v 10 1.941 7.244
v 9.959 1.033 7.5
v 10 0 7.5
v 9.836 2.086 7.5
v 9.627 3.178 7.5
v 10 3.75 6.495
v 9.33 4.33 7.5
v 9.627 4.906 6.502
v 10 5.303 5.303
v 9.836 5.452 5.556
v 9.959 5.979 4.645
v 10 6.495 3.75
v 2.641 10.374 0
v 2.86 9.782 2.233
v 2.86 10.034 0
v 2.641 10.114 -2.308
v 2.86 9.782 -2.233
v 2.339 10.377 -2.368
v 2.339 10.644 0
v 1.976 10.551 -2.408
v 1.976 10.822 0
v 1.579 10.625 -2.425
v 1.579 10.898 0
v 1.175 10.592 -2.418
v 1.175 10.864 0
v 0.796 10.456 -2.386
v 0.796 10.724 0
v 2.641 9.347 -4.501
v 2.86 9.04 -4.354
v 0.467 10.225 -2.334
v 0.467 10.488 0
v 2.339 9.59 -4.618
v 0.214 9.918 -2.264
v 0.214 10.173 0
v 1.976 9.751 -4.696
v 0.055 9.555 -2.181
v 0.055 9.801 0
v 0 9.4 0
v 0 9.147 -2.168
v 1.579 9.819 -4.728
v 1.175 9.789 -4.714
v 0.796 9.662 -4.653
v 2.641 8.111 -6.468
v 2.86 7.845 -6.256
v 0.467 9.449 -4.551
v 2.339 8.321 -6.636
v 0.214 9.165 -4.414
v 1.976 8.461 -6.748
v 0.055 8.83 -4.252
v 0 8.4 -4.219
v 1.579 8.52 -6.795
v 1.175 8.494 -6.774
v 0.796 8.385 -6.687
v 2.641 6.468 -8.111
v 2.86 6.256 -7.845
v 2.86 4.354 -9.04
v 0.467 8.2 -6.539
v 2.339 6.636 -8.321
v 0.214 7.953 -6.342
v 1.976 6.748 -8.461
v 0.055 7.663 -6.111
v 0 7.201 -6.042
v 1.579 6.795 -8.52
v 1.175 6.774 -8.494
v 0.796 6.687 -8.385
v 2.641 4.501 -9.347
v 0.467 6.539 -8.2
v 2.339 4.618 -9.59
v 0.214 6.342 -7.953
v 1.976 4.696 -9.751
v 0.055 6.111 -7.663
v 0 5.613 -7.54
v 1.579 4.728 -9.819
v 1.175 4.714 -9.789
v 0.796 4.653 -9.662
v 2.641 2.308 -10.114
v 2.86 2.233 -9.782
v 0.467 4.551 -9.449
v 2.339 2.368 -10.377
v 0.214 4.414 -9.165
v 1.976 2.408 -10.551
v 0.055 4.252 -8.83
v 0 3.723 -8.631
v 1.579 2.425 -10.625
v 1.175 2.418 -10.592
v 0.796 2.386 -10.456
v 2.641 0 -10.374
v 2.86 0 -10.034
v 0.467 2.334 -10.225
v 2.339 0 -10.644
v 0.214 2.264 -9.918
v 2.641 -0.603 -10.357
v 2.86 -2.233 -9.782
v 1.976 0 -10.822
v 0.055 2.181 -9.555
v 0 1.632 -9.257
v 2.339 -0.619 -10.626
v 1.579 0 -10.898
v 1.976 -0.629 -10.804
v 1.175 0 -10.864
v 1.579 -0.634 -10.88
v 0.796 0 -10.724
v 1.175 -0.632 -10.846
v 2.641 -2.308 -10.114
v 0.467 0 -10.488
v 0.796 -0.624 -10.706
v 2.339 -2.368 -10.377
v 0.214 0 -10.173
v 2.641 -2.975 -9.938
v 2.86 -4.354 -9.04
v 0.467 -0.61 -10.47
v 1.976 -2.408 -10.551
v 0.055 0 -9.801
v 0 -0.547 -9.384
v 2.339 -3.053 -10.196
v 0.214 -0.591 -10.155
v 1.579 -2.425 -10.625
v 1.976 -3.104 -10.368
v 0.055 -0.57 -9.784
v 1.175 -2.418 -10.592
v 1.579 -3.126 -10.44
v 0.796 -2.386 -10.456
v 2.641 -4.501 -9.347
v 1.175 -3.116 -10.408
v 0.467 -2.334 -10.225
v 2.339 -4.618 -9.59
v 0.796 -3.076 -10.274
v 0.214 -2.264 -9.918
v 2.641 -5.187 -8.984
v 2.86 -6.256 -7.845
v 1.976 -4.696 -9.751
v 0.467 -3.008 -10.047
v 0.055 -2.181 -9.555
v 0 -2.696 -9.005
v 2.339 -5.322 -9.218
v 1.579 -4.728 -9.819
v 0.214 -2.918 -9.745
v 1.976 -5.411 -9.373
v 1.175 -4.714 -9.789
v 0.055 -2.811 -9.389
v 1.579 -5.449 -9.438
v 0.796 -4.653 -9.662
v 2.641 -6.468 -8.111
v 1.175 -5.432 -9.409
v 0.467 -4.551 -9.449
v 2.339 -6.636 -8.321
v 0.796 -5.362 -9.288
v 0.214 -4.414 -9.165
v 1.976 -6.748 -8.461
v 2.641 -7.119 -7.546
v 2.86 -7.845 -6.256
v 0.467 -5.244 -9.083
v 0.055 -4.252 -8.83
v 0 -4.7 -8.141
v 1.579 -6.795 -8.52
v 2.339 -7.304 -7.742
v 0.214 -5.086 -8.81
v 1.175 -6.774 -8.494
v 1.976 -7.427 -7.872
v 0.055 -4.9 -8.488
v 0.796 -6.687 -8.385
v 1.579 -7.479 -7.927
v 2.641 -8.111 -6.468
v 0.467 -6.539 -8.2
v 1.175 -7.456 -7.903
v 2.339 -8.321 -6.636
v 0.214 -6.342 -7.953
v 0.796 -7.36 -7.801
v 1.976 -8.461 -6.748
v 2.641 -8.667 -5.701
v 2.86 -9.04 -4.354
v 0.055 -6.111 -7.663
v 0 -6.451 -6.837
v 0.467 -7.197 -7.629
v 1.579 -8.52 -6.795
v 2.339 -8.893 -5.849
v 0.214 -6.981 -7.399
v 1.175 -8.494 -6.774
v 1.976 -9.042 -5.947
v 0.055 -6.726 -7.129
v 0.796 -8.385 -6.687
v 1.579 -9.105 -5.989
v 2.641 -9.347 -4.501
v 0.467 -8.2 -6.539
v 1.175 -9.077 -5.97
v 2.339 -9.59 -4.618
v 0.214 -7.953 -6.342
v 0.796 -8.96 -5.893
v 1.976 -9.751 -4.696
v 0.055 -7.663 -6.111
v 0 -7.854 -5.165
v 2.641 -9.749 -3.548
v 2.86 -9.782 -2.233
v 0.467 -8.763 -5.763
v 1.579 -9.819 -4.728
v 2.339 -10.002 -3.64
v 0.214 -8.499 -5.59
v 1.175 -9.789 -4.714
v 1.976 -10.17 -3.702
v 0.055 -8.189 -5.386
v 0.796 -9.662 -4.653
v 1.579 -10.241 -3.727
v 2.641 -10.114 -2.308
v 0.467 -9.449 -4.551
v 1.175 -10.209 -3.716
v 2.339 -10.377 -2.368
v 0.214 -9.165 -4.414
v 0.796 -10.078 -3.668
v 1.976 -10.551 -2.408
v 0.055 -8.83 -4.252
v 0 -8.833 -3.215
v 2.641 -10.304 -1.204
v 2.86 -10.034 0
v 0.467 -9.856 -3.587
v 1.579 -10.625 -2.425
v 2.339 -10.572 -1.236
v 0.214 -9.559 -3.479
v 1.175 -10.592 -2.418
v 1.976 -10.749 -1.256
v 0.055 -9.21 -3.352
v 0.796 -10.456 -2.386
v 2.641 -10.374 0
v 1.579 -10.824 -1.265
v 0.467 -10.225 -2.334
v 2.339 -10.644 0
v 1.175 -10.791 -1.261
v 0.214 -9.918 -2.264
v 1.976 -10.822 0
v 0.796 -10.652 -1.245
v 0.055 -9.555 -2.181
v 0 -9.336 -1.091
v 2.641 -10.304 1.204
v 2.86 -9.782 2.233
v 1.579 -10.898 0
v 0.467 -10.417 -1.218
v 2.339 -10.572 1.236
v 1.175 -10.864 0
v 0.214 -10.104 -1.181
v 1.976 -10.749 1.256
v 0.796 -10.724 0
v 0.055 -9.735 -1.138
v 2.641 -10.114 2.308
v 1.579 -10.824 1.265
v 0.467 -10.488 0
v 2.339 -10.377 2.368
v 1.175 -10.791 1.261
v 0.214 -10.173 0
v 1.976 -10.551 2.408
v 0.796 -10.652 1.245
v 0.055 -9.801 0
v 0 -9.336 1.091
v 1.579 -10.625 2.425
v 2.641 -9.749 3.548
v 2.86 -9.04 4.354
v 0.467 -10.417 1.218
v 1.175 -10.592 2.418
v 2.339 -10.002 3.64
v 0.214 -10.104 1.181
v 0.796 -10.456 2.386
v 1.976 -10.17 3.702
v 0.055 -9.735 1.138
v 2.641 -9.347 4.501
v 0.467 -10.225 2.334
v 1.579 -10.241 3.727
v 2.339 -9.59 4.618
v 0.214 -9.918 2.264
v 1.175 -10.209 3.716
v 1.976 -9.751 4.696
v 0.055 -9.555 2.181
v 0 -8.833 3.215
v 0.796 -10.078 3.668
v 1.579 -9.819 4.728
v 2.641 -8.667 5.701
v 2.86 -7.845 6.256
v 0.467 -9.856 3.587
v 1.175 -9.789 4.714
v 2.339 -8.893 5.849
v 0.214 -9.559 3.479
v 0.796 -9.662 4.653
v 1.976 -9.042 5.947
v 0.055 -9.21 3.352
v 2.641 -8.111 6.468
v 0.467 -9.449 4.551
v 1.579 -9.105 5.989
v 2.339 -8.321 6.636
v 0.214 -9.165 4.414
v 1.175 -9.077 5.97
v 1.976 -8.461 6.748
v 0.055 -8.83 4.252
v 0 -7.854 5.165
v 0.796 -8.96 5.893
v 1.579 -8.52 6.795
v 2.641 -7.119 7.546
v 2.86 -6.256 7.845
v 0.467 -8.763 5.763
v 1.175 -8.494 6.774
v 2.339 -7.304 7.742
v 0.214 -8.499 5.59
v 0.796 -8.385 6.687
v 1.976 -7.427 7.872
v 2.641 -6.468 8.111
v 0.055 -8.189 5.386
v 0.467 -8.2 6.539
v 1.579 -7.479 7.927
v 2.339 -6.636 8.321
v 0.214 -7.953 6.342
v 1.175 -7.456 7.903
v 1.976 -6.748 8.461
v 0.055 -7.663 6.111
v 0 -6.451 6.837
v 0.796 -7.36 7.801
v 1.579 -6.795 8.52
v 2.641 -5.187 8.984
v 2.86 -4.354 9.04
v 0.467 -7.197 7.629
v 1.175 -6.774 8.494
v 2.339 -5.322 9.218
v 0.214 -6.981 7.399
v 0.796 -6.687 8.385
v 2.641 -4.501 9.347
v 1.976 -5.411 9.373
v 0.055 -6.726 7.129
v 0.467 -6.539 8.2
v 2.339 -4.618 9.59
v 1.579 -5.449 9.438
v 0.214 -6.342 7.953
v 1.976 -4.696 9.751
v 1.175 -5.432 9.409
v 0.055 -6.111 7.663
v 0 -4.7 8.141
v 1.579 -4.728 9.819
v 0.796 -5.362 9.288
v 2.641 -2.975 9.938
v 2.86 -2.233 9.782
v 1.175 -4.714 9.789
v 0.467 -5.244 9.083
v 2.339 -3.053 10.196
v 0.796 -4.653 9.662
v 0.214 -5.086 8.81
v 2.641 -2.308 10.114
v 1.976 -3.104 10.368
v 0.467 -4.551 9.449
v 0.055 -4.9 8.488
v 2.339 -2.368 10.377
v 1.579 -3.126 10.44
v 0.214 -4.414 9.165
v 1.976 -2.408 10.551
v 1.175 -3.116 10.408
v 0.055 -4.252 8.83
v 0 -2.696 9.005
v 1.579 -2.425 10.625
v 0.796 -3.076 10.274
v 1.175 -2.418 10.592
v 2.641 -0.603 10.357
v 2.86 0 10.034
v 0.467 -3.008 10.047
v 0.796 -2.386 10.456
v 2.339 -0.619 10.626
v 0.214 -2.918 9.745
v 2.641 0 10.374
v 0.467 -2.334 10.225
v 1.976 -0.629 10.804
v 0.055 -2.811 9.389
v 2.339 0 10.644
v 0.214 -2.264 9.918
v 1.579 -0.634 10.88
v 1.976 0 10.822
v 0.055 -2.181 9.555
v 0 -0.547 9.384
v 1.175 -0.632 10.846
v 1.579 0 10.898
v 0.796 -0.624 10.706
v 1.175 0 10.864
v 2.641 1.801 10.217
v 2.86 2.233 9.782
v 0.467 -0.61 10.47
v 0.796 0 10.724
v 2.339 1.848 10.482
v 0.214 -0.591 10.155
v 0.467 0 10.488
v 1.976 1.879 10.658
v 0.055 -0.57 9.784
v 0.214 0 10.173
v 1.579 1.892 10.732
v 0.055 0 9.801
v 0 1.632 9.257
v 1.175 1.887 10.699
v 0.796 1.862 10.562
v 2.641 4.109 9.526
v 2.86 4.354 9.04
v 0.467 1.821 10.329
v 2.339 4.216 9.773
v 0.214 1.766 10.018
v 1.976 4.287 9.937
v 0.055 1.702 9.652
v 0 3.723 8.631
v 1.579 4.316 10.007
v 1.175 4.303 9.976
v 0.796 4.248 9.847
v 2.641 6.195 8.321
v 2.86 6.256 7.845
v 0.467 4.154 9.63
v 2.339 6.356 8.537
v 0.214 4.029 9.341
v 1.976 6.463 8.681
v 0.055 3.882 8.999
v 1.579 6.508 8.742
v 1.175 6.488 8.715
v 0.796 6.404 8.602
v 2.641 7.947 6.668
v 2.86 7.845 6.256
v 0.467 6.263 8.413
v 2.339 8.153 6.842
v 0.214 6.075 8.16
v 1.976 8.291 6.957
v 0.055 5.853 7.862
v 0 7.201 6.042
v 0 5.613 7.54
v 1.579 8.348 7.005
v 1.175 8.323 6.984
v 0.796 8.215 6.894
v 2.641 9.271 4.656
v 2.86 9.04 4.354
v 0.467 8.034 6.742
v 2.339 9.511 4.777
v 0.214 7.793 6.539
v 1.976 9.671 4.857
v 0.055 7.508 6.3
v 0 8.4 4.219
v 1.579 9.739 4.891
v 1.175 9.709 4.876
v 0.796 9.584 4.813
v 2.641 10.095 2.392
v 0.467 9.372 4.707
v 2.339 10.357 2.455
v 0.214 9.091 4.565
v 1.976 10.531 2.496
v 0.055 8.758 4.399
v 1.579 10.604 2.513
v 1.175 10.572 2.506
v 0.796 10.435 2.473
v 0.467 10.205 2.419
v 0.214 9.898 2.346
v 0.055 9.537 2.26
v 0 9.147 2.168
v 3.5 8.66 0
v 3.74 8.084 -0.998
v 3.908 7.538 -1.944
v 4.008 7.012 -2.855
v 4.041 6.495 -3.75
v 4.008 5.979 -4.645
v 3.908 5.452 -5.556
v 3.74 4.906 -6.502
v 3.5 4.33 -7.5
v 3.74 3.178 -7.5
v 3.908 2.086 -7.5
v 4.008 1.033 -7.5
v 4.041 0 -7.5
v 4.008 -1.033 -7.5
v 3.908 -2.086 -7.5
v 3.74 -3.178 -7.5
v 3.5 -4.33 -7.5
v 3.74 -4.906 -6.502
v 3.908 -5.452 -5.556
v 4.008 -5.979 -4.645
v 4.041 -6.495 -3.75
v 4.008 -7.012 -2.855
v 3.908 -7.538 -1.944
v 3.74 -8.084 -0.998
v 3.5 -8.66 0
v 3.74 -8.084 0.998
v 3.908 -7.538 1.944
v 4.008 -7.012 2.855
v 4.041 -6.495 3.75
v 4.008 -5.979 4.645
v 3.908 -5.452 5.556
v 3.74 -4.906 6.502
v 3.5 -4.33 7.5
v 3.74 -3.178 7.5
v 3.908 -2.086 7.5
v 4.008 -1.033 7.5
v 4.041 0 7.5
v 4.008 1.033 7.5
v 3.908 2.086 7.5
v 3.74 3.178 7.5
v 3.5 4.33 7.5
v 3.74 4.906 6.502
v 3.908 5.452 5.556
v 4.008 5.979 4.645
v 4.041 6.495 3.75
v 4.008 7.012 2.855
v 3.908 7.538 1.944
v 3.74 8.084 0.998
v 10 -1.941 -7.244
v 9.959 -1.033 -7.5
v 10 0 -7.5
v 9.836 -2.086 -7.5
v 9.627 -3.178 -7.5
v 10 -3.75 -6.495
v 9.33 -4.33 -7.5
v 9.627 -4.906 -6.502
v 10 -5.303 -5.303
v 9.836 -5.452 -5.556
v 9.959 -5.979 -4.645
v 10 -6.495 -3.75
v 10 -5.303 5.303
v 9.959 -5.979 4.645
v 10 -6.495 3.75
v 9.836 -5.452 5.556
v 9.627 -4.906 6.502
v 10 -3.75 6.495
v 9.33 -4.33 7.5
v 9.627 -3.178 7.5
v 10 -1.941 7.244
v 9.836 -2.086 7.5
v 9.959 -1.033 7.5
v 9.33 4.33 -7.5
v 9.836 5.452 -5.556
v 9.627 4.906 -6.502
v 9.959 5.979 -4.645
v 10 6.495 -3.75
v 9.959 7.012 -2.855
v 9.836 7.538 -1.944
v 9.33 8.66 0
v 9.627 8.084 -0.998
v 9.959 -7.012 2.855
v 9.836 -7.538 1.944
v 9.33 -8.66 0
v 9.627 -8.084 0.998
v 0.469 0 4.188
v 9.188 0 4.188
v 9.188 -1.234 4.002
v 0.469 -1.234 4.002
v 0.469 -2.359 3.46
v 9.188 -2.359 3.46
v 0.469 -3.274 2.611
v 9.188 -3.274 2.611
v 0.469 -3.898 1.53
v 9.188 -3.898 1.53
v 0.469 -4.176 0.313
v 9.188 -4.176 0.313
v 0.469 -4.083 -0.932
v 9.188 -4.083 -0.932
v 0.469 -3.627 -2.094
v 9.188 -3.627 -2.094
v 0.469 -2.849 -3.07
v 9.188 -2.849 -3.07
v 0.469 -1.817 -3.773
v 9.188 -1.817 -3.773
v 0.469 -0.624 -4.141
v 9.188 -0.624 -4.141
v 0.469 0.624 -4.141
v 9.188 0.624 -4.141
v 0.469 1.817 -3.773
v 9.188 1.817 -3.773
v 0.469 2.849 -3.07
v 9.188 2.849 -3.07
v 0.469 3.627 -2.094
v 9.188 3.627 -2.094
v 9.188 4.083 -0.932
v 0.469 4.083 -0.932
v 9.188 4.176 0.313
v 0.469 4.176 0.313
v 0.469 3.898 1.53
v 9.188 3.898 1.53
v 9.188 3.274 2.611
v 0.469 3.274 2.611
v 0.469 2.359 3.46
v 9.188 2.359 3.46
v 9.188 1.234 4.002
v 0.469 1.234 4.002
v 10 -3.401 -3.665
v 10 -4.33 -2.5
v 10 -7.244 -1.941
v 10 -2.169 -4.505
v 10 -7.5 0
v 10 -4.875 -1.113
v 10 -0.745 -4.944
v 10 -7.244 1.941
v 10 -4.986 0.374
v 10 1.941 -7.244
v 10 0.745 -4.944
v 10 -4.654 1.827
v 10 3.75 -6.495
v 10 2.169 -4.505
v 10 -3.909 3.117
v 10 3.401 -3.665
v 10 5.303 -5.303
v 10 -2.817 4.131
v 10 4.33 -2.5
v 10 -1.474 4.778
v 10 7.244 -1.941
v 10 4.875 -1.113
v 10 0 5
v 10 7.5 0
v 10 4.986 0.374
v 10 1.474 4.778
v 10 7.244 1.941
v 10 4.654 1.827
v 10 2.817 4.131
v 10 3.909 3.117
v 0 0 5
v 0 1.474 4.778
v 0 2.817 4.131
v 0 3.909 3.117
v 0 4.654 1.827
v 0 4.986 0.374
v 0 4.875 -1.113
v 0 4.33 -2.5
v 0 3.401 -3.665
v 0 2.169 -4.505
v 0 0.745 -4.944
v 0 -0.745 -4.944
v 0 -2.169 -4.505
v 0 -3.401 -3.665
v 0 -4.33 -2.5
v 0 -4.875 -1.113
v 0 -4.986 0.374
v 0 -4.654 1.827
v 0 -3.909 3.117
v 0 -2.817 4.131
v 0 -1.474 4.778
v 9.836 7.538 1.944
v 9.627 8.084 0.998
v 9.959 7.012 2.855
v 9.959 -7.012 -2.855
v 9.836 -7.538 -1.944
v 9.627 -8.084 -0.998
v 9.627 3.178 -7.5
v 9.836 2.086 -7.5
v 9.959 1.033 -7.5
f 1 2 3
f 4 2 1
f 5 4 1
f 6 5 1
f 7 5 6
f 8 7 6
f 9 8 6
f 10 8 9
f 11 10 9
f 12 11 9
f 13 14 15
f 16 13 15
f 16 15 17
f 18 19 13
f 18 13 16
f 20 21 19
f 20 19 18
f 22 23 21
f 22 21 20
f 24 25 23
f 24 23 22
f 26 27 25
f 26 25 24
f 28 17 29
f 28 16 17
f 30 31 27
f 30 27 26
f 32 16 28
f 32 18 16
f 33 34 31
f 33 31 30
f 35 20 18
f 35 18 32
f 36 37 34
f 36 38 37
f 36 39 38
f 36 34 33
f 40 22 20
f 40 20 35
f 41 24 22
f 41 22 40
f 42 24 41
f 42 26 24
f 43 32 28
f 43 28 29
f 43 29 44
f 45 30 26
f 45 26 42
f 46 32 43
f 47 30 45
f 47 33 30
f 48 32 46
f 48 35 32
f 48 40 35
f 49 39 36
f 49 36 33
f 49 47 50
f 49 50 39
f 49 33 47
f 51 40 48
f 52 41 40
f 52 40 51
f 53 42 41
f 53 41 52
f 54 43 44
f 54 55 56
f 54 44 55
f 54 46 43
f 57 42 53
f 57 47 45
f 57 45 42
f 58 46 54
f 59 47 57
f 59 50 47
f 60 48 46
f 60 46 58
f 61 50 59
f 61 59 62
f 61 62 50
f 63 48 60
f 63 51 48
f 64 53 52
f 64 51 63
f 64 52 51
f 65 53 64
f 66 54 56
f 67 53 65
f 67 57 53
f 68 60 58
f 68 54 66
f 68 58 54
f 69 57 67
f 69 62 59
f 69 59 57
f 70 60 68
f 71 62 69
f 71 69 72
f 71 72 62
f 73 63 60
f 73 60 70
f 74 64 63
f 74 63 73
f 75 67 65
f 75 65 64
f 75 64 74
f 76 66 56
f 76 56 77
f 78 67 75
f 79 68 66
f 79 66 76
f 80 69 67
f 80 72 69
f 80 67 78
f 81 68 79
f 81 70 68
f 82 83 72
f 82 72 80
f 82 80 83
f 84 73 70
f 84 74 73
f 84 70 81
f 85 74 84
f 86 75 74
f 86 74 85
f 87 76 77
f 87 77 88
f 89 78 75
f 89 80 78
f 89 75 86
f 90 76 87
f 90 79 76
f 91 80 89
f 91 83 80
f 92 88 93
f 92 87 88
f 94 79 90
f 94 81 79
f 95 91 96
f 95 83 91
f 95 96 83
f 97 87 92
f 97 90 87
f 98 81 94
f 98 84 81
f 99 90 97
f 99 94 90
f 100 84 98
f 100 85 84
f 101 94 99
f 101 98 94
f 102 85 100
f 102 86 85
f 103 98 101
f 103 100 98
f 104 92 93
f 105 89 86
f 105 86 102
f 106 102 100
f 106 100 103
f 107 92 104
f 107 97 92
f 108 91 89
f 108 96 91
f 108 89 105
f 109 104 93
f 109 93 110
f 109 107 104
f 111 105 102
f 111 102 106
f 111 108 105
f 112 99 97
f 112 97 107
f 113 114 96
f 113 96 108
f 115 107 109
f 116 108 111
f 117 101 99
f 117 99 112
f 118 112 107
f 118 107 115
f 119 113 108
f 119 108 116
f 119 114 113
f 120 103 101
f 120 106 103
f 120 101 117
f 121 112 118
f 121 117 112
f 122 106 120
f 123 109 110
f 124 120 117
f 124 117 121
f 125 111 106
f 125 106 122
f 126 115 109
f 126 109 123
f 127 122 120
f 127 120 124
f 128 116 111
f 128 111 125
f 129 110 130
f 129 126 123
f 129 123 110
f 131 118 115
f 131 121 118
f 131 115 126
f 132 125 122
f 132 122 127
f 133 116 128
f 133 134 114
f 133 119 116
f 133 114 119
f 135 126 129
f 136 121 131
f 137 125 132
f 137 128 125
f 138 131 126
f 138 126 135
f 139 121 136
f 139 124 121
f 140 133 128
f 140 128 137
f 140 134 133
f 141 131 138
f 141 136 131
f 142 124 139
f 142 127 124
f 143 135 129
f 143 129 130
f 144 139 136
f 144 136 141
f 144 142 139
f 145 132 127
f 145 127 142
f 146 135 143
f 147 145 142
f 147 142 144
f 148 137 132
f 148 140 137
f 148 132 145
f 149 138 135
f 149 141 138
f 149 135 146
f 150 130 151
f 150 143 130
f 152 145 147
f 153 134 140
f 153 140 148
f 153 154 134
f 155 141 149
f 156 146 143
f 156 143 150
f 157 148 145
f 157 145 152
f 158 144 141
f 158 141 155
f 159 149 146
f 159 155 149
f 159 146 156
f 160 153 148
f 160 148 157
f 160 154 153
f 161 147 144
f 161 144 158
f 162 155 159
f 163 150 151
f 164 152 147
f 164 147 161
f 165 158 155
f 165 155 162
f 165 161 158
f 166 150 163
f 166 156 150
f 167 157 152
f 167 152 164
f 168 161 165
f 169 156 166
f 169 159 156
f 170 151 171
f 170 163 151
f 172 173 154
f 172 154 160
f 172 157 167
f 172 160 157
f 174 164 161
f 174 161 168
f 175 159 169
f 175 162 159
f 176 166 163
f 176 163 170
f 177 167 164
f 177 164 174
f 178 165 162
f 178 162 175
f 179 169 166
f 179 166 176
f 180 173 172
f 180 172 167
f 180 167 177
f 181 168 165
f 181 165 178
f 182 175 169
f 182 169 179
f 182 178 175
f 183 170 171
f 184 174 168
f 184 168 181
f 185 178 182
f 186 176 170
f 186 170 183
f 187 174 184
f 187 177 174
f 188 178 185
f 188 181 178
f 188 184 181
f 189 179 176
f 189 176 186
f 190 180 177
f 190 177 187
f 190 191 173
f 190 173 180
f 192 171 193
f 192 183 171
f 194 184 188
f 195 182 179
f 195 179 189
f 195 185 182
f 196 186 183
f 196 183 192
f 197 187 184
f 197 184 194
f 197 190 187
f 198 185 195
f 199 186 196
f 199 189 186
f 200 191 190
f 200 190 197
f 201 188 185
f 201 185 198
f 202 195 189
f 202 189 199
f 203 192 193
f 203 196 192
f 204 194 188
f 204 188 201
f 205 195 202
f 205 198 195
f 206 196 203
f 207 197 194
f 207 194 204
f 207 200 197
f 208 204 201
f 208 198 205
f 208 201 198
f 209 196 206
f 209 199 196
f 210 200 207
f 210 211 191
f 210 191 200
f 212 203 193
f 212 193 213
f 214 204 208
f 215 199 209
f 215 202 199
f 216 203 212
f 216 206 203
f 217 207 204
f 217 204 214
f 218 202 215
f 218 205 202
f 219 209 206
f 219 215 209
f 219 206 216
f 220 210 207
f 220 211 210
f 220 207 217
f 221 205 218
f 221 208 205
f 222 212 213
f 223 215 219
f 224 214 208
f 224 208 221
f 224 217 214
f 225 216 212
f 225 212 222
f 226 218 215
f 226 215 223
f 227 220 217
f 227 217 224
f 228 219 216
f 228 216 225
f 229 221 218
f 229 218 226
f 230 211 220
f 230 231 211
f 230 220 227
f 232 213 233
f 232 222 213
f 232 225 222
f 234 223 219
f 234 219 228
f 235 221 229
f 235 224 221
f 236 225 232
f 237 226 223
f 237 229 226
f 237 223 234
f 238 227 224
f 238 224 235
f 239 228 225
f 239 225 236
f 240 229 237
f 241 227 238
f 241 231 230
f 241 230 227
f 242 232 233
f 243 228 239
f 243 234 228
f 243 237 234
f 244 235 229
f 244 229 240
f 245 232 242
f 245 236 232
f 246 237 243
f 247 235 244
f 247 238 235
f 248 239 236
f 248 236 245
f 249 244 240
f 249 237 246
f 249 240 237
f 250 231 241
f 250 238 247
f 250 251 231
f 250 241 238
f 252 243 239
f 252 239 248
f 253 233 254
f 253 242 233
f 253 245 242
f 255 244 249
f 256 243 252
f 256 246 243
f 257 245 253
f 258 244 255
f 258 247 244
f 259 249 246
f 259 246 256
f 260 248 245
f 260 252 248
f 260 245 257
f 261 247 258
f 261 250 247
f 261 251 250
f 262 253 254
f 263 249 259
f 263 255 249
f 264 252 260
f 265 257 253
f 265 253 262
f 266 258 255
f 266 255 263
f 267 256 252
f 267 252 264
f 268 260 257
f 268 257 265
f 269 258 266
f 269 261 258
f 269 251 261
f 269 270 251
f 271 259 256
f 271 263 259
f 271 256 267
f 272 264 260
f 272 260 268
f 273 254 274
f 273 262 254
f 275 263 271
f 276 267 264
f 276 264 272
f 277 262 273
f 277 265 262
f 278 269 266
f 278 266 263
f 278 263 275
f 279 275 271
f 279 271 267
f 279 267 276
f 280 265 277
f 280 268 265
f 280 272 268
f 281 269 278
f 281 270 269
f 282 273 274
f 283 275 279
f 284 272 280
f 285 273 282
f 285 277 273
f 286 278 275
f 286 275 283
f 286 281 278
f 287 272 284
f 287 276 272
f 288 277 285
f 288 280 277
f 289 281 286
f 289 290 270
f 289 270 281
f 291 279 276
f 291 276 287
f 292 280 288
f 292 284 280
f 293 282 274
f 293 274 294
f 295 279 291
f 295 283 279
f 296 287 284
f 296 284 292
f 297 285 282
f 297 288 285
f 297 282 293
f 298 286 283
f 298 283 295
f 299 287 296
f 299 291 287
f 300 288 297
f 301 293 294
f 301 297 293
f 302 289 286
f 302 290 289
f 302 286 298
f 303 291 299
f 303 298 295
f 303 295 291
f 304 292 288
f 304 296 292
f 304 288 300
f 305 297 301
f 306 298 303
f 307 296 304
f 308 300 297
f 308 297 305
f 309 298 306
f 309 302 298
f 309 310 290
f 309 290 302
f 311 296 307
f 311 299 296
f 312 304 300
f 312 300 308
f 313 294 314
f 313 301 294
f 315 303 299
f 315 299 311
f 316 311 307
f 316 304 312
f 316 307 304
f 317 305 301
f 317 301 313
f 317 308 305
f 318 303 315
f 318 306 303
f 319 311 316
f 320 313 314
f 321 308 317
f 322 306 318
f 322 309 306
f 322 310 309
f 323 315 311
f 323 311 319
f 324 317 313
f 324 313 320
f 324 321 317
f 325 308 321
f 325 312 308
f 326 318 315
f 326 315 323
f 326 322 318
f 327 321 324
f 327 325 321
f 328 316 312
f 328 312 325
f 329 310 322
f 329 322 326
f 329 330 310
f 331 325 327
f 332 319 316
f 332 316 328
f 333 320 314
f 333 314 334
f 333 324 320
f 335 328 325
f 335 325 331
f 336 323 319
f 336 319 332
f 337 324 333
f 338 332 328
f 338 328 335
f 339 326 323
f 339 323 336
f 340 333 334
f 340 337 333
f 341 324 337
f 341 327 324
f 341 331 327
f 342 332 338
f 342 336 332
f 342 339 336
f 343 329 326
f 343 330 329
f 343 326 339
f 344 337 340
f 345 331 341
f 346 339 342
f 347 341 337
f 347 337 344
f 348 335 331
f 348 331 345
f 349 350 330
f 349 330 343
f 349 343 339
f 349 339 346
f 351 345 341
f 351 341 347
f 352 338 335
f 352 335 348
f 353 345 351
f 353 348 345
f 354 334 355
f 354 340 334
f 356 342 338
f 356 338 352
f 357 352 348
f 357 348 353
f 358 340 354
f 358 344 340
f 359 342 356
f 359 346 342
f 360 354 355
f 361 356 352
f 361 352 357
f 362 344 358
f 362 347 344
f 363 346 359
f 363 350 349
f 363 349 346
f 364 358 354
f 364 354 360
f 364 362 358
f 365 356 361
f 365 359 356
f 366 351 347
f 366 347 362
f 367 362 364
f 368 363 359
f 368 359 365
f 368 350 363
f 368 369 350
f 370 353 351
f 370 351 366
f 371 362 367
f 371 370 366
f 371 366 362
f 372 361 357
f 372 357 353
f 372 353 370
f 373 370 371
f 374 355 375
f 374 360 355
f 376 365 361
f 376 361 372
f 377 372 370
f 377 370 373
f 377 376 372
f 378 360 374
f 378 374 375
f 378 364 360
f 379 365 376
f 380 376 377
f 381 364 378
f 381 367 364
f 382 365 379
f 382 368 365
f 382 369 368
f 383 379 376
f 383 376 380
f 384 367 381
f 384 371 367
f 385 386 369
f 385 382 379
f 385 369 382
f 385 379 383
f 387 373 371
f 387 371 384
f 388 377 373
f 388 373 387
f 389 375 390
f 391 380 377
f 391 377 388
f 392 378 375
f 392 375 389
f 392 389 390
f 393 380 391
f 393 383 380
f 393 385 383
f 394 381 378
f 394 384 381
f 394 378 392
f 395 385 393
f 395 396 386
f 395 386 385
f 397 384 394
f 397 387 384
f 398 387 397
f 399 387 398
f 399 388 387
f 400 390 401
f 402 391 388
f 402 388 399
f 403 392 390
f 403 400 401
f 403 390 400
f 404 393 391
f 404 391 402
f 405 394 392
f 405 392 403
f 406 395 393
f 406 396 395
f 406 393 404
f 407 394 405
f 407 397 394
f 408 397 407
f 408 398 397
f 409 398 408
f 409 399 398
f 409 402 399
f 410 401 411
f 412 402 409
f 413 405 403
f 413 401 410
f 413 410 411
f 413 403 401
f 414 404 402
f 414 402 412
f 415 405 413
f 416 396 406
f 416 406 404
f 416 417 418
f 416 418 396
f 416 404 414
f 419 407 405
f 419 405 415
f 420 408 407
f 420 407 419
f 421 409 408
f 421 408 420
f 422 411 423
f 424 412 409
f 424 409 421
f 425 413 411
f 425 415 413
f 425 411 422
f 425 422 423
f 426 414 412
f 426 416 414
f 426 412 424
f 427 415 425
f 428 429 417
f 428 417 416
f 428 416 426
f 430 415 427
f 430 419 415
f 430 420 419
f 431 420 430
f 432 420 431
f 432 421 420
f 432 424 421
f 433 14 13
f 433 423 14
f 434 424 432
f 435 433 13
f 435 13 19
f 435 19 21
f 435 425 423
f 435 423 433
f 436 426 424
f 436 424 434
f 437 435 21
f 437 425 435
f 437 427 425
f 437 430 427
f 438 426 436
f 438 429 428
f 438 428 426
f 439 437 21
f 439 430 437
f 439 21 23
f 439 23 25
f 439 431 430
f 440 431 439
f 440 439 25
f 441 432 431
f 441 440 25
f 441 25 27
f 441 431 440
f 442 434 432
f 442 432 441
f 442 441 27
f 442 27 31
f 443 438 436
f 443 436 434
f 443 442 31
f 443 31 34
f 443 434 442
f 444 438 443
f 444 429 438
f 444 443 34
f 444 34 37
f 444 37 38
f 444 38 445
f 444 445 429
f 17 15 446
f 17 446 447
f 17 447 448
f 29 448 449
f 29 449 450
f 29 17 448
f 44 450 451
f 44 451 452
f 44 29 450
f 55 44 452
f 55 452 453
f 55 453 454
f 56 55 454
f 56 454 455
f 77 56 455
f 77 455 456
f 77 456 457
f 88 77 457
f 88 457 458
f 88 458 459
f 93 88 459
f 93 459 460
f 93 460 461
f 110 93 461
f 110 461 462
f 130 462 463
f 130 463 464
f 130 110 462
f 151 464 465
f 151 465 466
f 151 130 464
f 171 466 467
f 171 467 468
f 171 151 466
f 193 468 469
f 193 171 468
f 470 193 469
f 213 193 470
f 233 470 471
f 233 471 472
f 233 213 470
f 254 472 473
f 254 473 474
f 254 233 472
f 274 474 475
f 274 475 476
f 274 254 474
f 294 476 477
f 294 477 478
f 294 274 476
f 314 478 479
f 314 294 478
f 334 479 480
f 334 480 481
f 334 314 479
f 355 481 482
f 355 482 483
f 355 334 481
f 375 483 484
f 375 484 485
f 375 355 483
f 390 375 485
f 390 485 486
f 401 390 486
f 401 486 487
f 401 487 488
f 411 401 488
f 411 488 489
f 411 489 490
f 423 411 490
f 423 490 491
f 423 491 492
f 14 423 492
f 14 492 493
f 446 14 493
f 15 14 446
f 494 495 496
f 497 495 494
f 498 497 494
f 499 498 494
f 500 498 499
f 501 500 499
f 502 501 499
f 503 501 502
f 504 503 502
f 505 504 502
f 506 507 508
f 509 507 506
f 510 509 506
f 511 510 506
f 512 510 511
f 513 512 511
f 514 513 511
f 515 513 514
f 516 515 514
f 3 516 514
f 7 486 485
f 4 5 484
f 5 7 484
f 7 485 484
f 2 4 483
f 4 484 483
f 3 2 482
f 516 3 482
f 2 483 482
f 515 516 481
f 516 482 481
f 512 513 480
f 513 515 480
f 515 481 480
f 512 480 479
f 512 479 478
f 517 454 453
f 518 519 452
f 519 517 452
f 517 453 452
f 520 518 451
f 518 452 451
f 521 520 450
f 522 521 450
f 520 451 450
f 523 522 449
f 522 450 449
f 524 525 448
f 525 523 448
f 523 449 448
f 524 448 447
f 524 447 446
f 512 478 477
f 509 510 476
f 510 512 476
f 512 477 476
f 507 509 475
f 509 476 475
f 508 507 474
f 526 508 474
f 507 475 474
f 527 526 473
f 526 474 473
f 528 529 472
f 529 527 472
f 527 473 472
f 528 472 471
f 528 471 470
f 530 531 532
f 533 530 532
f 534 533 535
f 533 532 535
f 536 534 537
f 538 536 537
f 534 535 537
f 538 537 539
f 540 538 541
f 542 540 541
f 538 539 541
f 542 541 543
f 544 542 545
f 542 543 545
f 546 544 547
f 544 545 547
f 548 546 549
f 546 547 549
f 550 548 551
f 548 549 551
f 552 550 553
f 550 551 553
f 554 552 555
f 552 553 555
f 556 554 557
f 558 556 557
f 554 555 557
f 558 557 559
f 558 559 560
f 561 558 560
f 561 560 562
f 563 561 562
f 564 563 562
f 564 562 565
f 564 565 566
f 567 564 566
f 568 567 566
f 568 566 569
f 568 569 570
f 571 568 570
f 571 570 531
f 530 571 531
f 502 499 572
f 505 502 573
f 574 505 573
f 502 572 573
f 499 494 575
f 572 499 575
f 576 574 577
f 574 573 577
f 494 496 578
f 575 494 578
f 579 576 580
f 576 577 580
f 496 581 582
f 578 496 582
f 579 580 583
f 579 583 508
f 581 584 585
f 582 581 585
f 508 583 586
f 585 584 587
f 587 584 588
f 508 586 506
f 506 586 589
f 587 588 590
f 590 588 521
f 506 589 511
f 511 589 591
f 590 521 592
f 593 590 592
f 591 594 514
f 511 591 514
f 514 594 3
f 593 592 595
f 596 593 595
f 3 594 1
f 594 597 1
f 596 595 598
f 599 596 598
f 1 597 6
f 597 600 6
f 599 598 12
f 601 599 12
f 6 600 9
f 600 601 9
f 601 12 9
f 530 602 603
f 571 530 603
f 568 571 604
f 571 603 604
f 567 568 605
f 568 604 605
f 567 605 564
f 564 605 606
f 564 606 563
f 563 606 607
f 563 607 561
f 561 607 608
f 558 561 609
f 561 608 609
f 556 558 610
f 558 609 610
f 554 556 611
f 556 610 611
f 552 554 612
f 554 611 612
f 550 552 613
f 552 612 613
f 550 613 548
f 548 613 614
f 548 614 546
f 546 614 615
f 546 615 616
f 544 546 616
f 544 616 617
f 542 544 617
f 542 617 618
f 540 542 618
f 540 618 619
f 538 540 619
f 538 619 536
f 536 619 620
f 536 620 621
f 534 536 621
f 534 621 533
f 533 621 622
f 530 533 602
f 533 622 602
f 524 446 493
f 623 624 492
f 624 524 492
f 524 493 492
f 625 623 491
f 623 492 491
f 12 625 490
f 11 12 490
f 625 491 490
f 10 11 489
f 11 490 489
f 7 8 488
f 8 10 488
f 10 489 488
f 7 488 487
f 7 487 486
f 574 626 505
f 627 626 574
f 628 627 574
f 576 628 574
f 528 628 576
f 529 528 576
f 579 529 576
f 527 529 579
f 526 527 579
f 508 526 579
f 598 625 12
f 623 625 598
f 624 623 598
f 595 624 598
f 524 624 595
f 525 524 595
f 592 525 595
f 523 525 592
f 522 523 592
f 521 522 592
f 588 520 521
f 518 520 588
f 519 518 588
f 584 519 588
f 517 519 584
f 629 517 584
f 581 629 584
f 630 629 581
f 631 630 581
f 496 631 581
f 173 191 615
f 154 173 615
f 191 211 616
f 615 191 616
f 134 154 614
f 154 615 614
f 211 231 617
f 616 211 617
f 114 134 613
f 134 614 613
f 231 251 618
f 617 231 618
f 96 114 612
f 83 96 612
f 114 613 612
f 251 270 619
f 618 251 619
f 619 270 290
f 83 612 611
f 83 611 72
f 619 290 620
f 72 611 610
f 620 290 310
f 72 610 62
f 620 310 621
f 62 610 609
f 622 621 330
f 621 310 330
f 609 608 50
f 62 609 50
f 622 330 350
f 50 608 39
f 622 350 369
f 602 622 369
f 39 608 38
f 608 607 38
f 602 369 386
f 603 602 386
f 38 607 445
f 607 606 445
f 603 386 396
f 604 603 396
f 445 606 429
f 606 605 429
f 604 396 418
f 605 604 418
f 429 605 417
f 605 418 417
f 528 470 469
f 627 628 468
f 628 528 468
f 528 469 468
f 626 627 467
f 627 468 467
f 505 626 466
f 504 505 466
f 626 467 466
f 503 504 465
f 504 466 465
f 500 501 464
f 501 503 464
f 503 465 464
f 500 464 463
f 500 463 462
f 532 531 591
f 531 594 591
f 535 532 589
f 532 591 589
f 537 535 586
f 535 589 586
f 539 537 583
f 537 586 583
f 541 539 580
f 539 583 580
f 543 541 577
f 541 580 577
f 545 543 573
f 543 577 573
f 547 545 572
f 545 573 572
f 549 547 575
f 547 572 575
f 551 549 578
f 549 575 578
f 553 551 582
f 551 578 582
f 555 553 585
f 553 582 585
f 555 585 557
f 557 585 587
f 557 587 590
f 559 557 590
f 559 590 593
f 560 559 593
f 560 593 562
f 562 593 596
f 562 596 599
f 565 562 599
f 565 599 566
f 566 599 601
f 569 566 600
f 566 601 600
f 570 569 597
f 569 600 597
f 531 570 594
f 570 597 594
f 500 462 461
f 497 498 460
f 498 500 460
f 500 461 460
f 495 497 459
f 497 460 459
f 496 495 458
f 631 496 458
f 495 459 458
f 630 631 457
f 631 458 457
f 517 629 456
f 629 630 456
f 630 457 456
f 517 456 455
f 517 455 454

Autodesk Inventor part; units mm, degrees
ref_plane "YZ Plane" through (0, 0, 0) normal (1, 0, 0) x (0, 1, 0)
ref_plane "XZ Plane" through (0, 0, 0) normal (0, 1, 0) x (-1, 0, 0)
sketch "Boceto1" plane through (0, 0, 0) normal (0, 0, 1) x (1, 0, 0)
  line L0 (-2.3053, 0) -> (12.0509, 0) projected
  line L1 (4.0411, 7.5) -> (2.8595, 10.0339)
  line L2 (4.0411, 7.5) -> (10, 7.5) construction
  line L3 (10, 7.5) -> (10, 0) construction
  arc A0 (2.8595, 10.0339) -> (0, 9.4) centre (1.5, 9.4) ccw
  line L4 (4.0411, 7.5) -> (4.0411, 0)
  line L5 (0, -2.2363) -> (0, 13.4177) projected
  point P0 (0, 0)
  dimension "d2" = 15
  dimension "d4" = 21.8
  dimension "d5" = 1.5
  dimension "d15" = 10
  dimension "d16" = 25
revolve "Anilla" add sketch "Boceto1" angle 360 about axis through (-10, 0, 0) along (1, 0, 0)
sketch "Boceto2" plane through (0, 0, 0) normal (-1, 0, 0) x (0, 0, 1)
  circle A0 centre (0, 0) radius 4.9
  line L0 (-7.5, -4.3301) -> (-7.5, 4.3301)
  line L1 (-7.5, 4.3301) -> (0, 8.6603)
  line L2 (0, 8.6603) -> (7.5, 4.3301)
  line L3 (7.5, 4.3301) -> (7.5, -4.3301)
  line L4 (7.5, -4.3301) -> (0, -8.6603)
  line L5 (0, -8.6603) -> (-7.5, -4.3301)
  circle A1 centre (0, 0) radius 9.4 projected
  dimension "d6" = 17.3205
extrude "Cuerpo" add sketch "Boceto2" against normal blind 10 contours A0 | L0 L1 L2 L3 L4 L5
sketch "Boceto3" plane through (0, 0, 0) normal (0, 0, 1) x (1, 0, 0)
  line L0 (3.5, 8.6603) -> (10, 8.6603) projected
  line L1 (10, 4.3301) -> (10, 8.6603) projected
  line L2 (0, -9.4) -> (0, 9.4) projected
  line L3 (-2, 0) -> (12, 0) projected
  line L4 (9.3301, 8.6603) -> (10, 7.5)
  dimension "d10" = 30
  dimension "d11" = 15
revolve "Chaflán1" cut sketch "Boceto3" angle 360 about axis through (-10, 0, 0) along (1, 0, 0)
sketch "Boceto4" plane through (0, 0, 0) normal (-1, 0, 0) x (0, 0, 1)
  circle A0 centre (0, 0) radius 9.4 projected
hole "Rosca" at (0, 0, 0) direction (1, 0, 0) diameter 8.376 end through all thread size "M10x1.5" class "6H" standard "ISO Metric profile"
chamfer "Chaflán2" distance 0.8119 angle 30 1 edges at (0, 0, -4.188) measured on face at (0, 7.5614, -0.9181)
ref_plane "Work Plane1" through (32.4111, 0, 0) normal (0, 0, -1) x (-1, 0, 0)
chamfer "Chaflán3" distance 0.8119 angle 45 1 edges at (10, 0, -4.188)
equation "\"d2\" = SW"
equation "\"d4\" = LADI"
equation "\"d5\" = PHH"
equation "\"d15\" = KOH"
equation "\"d16\" = KEWI"
equation "\"d6\" = 1.1547 * SW"
equation "\"d7\" = KOH"
equation "\"d10\" = ANG1"
equation "\"d11\" = SW0"
equation "\"d12\" = -0.5 * GD1 + 0.5 * NND"
equation "\"d46\" = -0.5 * GD1 + 0.5 * NND"
equation "\"d51\" = -0.5 * GD1 + 0.5 * NND"
equation "\"ANG1\" = 30deg"
equation "\"KEWI\" = 25deg"
equation "\"LADI\" = 21.8"
equation "\"SW\" = 15"
equation "\"PHH\" = 1.5"
equation "\"KOH\" = NND"
equation "\"SW0\" = 15"
equation "\"d1\" = LADI"
equation "\"d3\" = PHH"
equation "\"GUL\" = 0.541266 * PTC"
equation "\"RR\" = PHH"
equation "\"TOA\" = 30deg"
equation "\"PTC\" = 1.5"
equation "\"GAL\" = 0.541266 * PTC"
equation "\"E0\" = 1.155 * SW"
equation "\"GD1\" = 8.376202"
equation "\"NND\" = 10"
properties part number "ISO 4161 - M10" material "Acero inoxidable"
